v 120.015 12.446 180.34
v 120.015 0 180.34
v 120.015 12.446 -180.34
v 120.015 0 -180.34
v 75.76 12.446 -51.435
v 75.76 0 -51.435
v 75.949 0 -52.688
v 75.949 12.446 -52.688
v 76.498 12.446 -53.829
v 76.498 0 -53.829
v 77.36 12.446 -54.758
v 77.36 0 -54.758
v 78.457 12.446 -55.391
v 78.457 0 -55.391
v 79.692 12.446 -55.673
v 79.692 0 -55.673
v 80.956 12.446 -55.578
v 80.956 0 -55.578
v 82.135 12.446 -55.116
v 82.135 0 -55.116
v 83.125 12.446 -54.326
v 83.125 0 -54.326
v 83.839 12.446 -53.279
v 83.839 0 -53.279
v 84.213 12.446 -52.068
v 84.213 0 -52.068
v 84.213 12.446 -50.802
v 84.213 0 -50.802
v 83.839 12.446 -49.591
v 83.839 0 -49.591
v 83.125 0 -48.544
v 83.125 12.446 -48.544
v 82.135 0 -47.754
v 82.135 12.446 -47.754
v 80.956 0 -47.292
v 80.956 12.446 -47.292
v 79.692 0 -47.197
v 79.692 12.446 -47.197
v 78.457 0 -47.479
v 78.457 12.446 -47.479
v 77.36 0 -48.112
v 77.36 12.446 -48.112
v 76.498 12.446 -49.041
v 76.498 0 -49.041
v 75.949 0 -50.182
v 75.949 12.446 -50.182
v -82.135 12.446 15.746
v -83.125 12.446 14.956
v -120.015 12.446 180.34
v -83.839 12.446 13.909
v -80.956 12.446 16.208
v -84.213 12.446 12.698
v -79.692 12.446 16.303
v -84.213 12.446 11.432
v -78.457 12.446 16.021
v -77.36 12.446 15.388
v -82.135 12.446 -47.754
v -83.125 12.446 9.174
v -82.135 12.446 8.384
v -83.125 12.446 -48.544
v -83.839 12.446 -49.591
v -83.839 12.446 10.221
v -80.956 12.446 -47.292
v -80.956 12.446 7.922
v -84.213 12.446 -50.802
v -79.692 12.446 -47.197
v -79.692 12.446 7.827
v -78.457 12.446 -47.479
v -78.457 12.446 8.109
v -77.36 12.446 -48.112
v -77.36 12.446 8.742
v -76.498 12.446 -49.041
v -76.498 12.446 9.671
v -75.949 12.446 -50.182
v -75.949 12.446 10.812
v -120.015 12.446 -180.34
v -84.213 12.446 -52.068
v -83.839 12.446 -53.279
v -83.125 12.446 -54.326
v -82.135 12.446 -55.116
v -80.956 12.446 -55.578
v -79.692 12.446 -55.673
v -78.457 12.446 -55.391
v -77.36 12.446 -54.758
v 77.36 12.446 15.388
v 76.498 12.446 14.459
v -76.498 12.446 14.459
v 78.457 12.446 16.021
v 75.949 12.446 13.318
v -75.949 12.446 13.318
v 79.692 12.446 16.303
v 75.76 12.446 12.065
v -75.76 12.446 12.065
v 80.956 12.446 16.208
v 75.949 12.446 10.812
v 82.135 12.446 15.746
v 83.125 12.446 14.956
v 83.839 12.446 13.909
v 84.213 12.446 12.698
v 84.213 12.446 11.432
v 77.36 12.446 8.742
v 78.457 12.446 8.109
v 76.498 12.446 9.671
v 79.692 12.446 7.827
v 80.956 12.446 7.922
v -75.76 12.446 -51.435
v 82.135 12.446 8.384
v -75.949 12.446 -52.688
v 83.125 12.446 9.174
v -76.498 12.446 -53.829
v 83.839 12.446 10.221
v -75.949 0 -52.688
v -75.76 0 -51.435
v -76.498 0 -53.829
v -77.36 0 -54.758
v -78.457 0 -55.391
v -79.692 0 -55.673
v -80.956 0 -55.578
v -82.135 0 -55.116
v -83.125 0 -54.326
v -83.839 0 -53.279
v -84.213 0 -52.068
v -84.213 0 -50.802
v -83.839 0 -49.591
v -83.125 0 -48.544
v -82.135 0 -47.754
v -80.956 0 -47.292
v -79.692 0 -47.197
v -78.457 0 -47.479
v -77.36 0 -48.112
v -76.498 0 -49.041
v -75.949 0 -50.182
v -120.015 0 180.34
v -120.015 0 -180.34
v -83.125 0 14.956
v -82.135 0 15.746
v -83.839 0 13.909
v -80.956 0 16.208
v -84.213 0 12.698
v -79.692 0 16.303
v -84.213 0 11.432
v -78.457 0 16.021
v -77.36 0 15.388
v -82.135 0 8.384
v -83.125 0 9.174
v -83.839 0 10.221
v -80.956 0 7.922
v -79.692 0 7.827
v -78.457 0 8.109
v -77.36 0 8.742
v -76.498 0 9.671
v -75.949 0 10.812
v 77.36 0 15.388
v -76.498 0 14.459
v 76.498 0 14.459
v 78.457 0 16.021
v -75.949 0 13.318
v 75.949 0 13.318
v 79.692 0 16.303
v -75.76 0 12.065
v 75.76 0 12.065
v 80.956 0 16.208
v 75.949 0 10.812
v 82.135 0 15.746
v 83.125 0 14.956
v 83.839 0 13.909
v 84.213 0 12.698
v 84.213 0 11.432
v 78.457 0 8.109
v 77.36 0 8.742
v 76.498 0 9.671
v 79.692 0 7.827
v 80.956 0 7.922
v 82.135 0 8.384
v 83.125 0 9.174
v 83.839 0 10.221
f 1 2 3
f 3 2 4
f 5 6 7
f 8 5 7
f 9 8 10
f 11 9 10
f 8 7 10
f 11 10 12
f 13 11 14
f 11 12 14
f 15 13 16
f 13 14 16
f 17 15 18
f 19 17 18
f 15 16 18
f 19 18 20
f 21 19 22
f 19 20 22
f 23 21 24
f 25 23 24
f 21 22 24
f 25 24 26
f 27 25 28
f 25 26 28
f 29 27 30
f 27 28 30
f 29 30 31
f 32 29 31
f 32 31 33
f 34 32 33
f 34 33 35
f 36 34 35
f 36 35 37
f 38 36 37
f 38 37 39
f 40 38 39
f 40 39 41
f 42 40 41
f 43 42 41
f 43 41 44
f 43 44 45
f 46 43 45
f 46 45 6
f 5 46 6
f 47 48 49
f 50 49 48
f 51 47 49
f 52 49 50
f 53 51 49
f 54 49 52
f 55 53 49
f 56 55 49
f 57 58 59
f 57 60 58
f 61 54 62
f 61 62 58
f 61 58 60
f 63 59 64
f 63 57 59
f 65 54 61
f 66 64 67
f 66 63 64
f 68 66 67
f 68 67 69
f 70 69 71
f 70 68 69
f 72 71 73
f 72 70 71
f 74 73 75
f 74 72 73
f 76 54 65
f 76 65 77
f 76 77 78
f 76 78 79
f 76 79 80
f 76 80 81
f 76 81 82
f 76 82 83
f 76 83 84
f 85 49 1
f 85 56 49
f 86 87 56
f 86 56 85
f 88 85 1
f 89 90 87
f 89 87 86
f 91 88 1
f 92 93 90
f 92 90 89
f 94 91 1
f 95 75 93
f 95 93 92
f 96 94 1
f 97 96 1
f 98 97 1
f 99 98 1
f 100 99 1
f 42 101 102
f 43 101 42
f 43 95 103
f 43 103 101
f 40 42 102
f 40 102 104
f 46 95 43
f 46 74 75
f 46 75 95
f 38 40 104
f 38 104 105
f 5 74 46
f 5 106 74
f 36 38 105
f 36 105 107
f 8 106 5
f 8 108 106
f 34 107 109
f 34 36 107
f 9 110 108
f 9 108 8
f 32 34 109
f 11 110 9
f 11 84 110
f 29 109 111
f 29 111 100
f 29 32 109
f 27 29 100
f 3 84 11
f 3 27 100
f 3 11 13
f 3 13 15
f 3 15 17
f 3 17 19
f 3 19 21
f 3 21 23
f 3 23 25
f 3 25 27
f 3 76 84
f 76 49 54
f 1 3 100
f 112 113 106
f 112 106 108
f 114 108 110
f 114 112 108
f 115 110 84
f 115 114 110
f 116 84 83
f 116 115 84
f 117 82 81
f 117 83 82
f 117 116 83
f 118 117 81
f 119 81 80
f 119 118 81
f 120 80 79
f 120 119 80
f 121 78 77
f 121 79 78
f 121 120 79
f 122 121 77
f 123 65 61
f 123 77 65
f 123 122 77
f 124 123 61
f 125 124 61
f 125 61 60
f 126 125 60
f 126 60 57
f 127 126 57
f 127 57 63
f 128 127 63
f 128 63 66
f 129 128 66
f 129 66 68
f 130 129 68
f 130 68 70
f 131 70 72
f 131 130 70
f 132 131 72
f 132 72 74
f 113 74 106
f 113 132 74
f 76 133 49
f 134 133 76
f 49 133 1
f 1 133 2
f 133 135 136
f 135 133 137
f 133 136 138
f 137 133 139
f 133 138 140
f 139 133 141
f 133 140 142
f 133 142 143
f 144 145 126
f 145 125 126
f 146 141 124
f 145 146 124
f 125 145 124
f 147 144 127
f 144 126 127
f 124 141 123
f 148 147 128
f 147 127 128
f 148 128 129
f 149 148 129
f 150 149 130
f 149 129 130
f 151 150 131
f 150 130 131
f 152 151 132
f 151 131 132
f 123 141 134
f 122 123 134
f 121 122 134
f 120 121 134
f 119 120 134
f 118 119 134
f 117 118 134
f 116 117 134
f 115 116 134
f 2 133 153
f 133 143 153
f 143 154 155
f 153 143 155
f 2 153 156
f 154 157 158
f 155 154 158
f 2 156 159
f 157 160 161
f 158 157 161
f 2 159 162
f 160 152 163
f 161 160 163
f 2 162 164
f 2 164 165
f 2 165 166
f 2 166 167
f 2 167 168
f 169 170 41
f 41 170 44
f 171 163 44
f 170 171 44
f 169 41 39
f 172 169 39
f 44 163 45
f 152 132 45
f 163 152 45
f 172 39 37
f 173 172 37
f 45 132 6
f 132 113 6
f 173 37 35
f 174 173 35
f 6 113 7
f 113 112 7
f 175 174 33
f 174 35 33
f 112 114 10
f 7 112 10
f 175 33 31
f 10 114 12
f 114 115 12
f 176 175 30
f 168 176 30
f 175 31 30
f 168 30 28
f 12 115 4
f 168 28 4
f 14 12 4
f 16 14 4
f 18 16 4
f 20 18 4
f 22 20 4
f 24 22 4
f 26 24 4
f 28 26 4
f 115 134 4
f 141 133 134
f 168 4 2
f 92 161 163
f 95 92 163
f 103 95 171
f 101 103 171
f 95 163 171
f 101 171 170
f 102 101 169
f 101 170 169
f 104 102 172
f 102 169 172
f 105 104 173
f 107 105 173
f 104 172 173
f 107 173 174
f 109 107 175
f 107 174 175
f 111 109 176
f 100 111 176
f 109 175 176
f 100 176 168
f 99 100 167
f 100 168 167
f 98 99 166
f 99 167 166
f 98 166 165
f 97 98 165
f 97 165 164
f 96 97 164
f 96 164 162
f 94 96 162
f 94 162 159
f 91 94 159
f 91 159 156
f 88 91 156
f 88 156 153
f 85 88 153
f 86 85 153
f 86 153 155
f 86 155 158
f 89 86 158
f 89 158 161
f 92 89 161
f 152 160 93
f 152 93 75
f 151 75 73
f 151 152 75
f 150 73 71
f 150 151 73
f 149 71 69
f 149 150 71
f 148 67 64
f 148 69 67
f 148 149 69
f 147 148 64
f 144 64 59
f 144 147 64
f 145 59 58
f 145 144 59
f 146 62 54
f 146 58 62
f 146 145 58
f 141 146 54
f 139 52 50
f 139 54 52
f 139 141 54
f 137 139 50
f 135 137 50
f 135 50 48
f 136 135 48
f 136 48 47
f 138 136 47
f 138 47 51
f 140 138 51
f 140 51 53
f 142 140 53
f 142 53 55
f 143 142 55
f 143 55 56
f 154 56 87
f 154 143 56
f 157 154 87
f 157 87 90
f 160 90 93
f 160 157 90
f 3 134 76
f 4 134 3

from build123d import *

# Parameters (mm, degrees)
SKETCH1_W              = 240.03
SKETCH1_H              = 360.68
BOSS_EXTRUDE1_DEPTH    = 12.446
M10X1_5_TAPPED_HOLE1_D = 8.5


with BuildPart() as part:
    # Sketch1 → Boss-Extrude1 (new body)
    with BuildSketch(Plane(origin=(0, 0, 0), x_dir=(1, 0, 0), z_dir=(0, 1, 0))):
        Rectangle(SKETCH1_W, SKETCH1_H)
    extrude(amount=BOSS_EXTRUDE1_DEPTH)

    # M10x1.5 Tapped Hole1 (through all)
    with Locations(Plane(origin=(0, 12.446, 0), x_dir=(1, 0, 0), z_dir=(0, 1, 0))):
        with Locations((80.01, 51.435), (80.01, -12.065)):
            m10x1_5_tapped_hole1 = Hole(M10X1_5_TAPPED_HOLE1_D / 2)

    # Mirror1: M10x1.5 Tapped Hole1 across plane
    add(m10x1_5_tapped_hole1.mirror(Plane.ZY), mode=Mode.SUBTRACT)


solid = part.part
